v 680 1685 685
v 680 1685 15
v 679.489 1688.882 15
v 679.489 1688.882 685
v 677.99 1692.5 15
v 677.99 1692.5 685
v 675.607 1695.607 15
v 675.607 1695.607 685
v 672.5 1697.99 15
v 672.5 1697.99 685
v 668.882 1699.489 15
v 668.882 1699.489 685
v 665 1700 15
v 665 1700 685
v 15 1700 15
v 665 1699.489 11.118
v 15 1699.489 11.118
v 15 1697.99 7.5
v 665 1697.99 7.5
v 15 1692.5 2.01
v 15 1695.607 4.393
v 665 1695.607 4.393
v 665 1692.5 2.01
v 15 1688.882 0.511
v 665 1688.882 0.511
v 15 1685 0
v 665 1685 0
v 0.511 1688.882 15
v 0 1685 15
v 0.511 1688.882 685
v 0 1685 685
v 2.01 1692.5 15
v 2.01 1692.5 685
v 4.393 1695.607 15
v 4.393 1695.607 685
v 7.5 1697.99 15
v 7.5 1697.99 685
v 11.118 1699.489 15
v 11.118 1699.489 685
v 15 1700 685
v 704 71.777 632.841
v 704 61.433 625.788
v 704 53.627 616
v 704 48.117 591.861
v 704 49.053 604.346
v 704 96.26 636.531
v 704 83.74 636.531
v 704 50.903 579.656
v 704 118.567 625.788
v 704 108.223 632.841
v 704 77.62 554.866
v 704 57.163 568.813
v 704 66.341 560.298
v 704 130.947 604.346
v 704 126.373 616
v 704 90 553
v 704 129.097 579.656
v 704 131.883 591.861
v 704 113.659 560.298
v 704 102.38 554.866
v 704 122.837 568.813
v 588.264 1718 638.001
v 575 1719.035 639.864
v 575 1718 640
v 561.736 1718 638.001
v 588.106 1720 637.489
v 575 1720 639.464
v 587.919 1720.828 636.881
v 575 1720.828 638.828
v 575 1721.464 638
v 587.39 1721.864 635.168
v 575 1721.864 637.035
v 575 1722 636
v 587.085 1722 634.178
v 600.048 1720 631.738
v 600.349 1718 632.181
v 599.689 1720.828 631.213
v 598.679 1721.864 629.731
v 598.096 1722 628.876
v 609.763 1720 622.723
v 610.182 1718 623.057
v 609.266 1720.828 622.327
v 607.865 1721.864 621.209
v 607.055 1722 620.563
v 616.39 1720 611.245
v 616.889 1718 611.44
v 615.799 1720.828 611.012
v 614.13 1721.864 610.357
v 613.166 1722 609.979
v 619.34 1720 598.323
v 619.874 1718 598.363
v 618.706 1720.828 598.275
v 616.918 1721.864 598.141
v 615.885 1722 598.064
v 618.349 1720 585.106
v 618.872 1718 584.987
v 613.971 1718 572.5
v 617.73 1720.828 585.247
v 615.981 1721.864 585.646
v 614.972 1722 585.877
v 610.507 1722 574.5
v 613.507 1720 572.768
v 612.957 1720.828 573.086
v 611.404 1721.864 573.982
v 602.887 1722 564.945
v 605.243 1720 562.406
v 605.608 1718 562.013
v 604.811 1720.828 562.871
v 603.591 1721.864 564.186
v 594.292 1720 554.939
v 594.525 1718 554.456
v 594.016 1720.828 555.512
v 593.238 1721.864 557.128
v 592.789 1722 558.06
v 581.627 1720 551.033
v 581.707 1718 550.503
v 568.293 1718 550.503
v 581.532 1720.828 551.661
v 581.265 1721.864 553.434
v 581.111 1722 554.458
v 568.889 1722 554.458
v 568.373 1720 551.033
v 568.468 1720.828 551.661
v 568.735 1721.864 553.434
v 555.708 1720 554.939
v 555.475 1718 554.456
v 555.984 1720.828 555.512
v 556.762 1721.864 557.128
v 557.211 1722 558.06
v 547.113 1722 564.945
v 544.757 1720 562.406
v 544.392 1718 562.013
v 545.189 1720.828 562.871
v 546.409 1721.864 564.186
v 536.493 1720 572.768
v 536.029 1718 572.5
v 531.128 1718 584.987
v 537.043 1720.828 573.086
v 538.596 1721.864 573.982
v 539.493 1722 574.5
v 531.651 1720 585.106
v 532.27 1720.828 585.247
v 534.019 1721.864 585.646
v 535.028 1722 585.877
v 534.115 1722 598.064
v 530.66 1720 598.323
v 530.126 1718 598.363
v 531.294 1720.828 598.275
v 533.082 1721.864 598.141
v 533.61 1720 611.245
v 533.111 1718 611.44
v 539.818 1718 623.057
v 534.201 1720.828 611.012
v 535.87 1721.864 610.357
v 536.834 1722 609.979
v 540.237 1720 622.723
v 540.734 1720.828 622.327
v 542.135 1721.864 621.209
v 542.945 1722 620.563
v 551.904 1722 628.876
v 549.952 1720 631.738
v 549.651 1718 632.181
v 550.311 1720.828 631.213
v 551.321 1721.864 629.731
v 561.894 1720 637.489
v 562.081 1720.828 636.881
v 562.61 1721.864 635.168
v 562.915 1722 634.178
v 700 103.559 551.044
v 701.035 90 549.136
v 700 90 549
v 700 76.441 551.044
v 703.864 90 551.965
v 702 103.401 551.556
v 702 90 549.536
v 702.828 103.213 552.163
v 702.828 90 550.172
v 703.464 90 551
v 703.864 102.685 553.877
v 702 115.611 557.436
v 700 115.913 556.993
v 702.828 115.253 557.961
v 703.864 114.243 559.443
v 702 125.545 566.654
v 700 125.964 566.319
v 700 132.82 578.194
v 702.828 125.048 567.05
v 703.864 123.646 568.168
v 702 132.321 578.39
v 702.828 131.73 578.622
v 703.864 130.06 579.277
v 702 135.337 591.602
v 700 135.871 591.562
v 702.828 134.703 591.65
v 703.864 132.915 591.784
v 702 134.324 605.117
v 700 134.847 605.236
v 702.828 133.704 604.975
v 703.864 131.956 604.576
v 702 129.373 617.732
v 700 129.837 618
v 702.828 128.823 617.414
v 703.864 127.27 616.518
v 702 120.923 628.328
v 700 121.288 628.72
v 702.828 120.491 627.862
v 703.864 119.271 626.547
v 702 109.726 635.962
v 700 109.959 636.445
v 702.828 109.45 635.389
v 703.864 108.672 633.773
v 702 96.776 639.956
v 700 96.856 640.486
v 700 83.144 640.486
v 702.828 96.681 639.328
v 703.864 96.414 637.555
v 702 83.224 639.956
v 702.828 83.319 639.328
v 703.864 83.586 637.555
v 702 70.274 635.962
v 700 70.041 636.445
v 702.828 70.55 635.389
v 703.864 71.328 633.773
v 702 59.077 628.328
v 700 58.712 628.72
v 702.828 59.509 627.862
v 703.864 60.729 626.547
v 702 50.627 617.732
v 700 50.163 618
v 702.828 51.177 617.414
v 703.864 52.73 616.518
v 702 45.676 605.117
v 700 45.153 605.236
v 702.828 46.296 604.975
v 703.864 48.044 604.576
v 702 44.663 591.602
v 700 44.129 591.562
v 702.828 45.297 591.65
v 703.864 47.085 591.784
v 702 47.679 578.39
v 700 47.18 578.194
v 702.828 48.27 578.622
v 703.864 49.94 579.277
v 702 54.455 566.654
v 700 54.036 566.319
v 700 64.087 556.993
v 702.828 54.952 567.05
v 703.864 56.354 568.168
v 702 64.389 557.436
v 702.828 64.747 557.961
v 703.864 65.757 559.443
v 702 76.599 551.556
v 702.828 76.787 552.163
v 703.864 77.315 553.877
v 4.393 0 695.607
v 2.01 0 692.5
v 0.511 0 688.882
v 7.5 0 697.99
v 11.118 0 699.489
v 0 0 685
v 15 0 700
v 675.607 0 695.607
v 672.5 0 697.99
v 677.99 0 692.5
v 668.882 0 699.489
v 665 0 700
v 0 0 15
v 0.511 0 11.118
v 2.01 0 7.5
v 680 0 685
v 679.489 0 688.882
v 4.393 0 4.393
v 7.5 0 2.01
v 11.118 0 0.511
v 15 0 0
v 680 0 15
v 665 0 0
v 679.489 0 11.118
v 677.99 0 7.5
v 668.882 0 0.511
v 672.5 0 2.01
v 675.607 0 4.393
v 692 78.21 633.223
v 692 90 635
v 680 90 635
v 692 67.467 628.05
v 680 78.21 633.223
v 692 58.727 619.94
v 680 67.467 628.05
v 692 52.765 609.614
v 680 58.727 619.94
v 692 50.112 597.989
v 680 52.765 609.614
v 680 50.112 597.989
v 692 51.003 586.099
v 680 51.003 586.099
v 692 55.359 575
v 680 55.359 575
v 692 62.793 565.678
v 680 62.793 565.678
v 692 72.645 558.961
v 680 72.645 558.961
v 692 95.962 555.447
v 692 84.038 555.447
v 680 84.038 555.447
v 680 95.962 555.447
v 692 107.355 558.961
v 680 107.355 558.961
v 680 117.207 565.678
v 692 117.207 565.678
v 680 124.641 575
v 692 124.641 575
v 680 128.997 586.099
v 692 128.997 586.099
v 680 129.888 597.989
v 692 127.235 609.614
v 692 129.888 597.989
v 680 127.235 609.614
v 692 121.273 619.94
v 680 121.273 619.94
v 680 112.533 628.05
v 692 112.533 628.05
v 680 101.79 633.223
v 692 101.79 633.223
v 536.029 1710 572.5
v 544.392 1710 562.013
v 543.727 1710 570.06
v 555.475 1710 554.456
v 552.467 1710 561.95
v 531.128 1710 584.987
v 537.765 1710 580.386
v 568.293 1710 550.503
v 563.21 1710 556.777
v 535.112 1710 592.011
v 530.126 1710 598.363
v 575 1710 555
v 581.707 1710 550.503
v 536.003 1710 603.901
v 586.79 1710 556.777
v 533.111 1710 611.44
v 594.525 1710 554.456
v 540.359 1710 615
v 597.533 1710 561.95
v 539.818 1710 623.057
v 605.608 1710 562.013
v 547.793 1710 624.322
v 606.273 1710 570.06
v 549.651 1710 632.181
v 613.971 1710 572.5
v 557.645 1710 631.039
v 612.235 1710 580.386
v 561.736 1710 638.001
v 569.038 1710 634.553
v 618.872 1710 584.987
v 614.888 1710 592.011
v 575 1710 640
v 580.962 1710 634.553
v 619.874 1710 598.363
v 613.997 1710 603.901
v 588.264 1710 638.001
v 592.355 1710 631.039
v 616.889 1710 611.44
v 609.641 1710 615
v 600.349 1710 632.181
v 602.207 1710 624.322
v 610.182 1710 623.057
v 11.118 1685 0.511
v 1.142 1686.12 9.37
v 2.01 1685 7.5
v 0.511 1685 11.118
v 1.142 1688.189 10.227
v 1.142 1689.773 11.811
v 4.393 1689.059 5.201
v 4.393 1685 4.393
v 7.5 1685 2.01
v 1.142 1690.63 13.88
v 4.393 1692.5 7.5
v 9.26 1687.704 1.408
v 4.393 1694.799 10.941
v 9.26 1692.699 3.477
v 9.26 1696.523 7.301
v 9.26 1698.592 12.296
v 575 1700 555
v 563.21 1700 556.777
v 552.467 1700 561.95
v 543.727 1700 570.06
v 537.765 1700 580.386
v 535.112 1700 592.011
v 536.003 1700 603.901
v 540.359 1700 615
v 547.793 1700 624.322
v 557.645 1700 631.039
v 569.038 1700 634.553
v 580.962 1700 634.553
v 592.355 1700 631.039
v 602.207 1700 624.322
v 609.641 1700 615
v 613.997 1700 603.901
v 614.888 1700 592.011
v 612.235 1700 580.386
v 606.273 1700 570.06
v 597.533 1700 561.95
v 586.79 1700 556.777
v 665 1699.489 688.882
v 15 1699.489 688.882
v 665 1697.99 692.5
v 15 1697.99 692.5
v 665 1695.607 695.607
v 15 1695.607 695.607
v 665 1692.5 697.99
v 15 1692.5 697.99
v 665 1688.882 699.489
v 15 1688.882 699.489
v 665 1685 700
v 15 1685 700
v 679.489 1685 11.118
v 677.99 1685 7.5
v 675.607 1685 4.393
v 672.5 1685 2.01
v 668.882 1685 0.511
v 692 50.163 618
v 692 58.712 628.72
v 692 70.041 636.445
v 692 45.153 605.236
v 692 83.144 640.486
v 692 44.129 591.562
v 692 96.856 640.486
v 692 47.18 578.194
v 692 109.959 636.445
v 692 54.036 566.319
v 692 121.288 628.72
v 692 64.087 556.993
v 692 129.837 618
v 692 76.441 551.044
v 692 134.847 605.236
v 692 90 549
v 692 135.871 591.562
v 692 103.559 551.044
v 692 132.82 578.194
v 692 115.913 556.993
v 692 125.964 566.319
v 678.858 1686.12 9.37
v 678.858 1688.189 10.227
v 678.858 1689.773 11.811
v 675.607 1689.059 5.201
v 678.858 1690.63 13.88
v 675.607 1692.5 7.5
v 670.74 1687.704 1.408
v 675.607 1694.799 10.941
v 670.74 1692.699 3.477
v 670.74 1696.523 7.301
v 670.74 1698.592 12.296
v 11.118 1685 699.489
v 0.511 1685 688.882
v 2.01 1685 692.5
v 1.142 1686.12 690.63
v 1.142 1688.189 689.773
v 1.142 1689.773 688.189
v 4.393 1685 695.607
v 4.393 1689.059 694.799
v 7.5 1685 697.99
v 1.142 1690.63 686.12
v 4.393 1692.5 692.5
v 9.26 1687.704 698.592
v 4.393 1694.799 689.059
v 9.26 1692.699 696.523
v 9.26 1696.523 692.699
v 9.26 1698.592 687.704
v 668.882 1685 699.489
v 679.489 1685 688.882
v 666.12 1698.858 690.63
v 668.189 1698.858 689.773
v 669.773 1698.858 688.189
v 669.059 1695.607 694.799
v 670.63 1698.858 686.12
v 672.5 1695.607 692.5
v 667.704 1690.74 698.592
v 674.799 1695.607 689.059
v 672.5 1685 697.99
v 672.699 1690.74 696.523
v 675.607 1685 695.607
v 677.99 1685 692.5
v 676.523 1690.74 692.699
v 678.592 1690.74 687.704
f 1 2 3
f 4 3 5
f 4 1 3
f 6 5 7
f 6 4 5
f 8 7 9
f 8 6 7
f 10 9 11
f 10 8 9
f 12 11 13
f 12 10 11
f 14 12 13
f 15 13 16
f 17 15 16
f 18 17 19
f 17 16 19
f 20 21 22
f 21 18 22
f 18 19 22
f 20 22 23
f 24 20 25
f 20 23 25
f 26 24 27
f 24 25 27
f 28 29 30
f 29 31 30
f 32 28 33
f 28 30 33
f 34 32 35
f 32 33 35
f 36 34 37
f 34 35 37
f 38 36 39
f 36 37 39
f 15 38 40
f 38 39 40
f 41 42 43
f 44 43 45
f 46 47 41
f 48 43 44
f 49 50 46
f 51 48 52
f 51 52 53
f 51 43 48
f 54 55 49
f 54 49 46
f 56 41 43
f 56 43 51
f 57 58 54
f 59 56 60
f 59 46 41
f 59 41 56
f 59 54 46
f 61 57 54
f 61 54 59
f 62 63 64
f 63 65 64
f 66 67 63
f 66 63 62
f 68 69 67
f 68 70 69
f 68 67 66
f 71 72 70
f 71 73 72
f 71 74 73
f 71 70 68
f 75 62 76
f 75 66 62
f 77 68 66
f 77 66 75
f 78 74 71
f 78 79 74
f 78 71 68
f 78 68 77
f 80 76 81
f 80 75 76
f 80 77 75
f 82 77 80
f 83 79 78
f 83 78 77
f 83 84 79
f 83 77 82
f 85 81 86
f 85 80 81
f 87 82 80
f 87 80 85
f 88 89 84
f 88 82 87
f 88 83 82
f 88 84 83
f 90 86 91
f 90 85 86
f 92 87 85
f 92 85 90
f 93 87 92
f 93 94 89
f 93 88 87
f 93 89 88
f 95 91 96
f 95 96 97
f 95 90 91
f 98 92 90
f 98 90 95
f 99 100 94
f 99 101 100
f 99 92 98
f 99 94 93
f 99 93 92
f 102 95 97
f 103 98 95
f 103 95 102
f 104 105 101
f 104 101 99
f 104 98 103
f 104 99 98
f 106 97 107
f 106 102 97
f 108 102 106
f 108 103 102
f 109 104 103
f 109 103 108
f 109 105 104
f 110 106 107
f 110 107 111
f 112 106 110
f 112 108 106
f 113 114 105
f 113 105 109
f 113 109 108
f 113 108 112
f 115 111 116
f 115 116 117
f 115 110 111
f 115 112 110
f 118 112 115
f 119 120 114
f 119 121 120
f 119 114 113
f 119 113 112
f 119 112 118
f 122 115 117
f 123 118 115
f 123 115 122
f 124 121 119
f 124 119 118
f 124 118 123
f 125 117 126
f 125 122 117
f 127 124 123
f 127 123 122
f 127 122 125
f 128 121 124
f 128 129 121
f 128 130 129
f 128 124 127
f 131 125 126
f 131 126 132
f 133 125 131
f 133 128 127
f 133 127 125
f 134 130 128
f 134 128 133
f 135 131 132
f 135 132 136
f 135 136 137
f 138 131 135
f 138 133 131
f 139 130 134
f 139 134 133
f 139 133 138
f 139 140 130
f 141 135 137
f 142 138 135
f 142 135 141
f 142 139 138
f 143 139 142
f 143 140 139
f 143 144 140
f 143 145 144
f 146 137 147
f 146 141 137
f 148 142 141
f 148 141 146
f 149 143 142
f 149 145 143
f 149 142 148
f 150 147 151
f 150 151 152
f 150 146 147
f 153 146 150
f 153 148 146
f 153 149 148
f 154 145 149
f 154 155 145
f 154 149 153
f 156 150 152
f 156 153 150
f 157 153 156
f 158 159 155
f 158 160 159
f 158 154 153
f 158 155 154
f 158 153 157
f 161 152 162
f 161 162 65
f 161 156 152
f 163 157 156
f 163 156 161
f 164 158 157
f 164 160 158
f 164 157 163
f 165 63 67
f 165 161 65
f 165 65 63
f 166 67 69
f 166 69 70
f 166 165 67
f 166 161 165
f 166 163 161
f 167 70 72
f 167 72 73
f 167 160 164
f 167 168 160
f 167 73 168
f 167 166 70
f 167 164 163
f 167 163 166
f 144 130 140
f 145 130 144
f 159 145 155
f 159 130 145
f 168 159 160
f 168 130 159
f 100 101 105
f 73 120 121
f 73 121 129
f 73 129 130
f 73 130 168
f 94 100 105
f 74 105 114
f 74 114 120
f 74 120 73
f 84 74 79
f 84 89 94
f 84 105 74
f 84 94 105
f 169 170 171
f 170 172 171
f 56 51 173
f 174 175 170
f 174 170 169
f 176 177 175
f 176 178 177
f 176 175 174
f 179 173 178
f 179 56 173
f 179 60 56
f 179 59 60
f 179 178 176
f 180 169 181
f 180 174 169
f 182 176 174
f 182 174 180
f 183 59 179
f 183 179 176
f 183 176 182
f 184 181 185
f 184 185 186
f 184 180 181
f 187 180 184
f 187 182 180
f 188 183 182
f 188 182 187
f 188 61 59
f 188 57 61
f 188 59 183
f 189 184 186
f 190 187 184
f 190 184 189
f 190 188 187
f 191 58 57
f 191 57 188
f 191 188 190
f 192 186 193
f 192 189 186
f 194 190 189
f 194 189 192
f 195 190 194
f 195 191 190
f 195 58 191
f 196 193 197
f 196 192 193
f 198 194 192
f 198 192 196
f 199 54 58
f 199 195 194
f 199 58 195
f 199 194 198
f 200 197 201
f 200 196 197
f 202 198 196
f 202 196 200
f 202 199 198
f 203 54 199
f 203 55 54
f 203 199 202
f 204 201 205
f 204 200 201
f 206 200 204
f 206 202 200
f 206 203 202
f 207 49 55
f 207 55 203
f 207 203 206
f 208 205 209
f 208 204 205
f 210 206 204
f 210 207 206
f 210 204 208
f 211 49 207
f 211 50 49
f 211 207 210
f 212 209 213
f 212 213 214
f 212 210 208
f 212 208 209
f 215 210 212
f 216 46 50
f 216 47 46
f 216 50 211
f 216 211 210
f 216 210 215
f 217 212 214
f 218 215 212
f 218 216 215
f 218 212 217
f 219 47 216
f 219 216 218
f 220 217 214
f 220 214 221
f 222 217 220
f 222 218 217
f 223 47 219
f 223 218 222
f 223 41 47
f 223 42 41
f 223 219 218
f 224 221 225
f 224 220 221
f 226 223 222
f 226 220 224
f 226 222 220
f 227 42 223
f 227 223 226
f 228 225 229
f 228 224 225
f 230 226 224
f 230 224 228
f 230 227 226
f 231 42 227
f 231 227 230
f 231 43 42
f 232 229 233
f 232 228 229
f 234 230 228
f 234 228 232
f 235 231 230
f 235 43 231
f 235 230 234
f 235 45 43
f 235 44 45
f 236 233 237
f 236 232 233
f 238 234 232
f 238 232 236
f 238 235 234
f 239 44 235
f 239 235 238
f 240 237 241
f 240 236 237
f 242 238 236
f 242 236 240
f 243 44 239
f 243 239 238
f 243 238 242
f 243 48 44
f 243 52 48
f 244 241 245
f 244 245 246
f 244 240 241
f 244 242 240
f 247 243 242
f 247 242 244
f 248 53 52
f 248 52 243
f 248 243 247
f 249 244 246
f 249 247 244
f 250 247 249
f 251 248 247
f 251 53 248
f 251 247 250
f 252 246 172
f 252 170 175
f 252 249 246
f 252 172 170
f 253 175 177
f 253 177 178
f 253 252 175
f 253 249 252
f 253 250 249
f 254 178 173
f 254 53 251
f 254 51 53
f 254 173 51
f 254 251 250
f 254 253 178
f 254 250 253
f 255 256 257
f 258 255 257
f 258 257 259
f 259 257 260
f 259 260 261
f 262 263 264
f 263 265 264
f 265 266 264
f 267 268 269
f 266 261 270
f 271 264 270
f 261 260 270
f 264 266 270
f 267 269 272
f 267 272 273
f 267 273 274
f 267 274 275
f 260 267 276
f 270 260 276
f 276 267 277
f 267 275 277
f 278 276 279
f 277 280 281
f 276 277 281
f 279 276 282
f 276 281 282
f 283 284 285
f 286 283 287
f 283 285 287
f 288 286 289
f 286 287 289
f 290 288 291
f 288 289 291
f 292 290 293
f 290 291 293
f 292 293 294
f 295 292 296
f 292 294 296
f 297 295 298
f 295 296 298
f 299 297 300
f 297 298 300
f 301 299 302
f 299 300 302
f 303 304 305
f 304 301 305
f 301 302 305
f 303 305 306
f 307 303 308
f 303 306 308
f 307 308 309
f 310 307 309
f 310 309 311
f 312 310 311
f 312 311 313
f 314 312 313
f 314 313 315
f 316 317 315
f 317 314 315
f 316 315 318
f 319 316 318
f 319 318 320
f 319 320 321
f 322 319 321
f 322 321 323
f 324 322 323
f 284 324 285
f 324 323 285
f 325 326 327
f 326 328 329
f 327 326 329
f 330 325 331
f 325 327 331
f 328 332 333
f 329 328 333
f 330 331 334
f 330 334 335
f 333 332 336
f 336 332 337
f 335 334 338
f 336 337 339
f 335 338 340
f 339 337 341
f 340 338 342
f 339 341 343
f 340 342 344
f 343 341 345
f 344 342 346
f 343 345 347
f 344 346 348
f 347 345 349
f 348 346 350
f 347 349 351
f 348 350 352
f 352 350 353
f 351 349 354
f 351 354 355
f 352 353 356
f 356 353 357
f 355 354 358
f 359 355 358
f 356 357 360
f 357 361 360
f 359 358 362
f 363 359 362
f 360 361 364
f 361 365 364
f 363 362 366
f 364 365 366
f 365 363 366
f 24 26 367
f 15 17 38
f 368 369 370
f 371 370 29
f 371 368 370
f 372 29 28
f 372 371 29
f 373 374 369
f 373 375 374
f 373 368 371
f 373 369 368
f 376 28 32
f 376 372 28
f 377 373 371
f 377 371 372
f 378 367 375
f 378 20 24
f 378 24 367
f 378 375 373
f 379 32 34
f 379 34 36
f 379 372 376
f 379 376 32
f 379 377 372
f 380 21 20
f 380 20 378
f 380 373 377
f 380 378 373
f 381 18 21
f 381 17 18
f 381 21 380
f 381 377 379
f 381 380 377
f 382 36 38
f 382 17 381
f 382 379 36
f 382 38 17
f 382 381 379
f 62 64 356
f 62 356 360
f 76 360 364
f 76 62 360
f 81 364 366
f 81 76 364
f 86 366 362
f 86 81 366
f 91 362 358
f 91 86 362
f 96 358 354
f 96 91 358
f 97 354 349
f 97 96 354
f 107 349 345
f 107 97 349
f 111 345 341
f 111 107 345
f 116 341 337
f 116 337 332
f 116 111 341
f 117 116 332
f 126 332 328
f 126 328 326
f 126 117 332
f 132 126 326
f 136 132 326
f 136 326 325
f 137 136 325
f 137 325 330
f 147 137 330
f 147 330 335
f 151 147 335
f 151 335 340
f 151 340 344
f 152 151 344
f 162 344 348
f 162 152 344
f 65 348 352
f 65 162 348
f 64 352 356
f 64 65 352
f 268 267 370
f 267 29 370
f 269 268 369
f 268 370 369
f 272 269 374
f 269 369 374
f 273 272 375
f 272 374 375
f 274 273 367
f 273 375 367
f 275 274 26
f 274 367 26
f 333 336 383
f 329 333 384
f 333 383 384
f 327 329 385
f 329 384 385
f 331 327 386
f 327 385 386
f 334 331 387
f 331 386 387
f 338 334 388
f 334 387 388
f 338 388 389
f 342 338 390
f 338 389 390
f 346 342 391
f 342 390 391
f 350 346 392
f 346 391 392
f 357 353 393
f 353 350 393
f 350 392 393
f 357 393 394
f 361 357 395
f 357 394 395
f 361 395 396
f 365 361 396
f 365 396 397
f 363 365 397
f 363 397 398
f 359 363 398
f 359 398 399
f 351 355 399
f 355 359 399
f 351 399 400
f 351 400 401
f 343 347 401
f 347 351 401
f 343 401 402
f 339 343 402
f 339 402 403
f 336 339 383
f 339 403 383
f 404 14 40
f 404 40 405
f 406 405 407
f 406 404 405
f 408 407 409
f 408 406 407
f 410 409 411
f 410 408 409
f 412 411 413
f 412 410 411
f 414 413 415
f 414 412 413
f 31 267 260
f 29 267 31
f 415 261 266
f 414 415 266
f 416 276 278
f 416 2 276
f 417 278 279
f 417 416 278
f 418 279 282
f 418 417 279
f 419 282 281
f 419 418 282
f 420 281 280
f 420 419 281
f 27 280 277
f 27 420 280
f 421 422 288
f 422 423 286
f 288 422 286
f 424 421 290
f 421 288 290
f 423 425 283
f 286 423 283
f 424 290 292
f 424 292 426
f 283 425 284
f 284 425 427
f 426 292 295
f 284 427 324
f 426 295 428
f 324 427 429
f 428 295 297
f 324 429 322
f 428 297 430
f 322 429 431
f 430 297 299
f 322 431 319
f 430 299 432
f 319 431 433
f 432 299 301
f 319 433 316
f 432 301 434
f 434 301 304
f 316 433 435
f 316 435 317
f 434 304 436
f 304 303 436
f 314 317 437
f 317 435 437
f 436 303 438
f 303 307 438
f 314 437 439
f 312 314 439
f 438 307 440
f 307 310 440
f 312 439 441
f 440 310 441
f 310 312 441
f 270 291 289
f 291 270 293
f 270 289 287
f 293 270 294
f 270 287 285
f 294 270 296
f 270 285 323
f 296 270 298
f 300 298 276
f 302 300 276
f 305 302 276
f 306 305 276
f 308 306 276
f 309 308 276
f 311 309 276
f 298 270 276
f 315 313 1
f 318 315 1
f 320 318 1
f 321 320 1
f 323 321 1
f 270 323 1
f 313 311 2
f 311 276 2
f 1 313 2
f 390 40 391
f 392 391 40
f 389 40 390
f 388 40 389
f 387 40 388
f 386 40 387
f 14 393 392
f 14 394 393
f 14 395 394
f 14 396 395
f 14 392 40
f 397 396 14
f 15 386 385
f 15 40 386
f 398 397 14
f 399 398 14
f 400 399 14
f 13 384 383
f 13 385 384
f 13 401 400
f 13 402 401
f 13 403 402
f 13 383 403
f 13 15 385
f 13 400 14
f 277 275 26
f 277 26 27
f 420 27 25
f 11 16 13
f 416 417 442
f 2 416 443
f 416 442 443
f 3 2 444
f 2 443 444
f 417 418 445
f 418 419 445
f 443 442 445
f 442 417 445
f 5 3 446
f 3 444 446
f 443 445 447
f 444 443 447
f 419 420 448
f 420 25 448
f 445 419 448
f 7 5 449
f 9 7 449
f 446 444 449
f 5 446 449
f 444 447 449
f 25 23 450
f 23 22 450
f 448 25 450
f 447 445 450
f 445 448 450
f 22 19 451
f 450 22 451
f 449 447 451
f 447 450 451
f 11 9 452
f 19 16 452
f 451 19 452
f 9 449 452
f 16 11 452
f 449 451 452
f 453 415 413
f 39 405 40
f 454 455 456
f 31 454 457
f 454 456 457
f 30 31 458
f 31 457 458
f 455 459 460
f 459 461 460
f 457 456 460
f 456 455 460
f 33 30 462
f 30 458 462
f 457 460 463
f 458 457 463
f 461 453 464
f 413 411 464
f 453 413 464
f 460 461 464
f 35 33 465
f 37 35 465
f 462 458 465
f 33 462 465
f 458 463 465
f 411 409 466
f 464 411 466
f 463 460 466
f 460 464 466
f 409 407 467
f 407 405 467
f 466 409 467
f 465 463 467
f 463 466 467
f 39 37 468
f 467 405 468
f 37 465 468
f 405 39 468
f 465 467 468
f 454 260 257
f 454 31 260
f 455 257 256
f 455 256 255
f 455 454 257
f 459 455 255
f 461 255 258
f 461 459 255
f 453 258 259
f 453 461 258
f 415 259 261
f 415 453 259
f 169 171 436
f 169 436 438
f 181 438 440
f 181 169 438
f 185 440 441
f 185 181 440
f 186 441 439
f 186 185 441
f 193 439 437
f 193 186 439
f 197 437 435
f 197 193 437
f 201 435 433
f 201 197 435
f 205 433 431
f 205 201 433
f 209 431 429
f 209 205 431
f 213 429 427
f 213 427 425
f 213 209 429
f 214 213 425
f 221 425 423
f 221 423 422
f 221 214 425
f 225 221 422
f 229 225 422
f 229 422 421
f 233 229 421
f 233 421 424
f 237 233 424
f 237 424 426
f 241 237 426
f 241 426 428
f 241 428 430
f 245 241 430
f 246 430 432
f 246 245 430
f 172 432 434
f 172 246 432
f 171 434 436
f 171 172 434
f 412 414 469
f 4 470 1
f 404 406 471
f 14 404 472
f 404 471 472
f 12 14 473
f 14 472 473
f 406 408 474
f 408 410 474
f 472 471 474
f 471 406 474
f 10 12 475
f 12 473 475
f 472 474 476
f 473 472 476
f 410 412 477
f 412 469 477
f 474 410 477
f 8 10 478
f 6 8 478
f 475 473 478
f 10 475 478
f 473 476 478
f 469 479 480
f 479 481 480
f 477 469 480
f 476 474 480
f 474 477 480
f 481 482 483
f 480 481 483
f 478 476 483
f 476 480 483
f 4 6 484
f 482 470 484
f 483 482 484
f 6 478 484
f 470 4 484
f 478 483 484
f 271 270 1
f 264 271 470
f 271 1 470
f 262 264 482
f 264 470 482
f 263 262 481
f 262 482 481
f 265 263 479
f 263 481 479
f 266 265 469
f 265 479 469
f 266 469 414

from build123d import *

# Parameters (mm, degrees)
CROQUIS1_W              = 680
CROQUIS1_H              = 1700
SALIENTE_EXTRUIR1_DEPTH = 700
REDONDEO1_R             = 15
CROQUIS4_R              = 40
SALIENTE_EXTRUIR4_DEPTH = 22
CROQUIS5_R              = 45
SALIENTE_EXTRUIR5_DEPTH = 12
REDONDEO3_R             = 4
CROQUIS6_R              = 40
SALIENTE_EXTRUIR6_DEPTH = 24
CROQUIS7_R              = 46
SALIENTE_EXTRUIR7_DEPTH = 12
REDONDEO5_R             = 4


with BuildPart() as part:
    # Croquis1 → Saliente-Extruir1 (new body)
    with BuildSketch(Plane.XY):
        with Locations((340, 850)):
            Rectangle(CROQUIS1_W, CROQUIS1_H)
    extrude(amount=SALIENTE_EXTRUIR1_DEPTH)

    # Redondeo1
    redondeo1_edges = [part.edges().sort_by_distance(p)[0] for p in [
        (680, 850, 700),
        (340, 1700, 700),
        (0, 850, 700),
        (340, 1700, 0),
        (680, 850, 0),
        (0, 850, 0),
        (0, 1700, 350),
        (680, 1700, 350),
    ]]
    fillet(redondeo1_edges, radius=REDONDEO1_R)

    # Croquis4 → Saliente-Extruir4 (add)
    with BuildSketch(Plane(origin=(0, 1700, 0), x_dir=(1, 0, 0), z_dir=(0, 1, 0))):
        with Locations(Location((575, -595, 0), (0, 0, 90))):
            Circle(CROQUIS4_R)
    extrude(amount=SALIENTE_EXTRUIR4_DEPTH)

    # Croquis5 → Saliente-Extruir5 (add)
    with BuildSketch(Plane(origin=(0, 1722, 0), x_dir=(1, 0, 0), z_dir=(0, 1, 0))):
        with Locations(Location((575, -595, 0), (0, 0, 270))):
            Circle(CROQUIS5_R)
    extrude(amount=-SALIENTE_EXTRUIR5_DEPTH)

    # Redondeo3
    redondeo3_edges = [part.edges().sort_by_distance(p)[0] for p in [
        (575, 1722, 550),
    ]]
    fillet(redondeo3_edges, radius=REDONDEO3_R)

    # Croquis6 → Saliente-Extruir6 (add)
    with BuildSketch(Plane(origin=(680, 0, 0), x_dir=(0, 0, -1), z_dir=(1, 0, 0))):
        with Locations(Location((-595, 90, 0), (0, 0, 180))):
            Circle(CROQUIS6_R)
    extrude(amount=SALIENTE_EXTRUIR6_DEPTH)

    # Croquis7 → Saliente-Extruir7 (add)
    with BuildSketch(Plane(origin=(704, 0, 0), x_dir=(0, 0, -1), z_dir=(1, 0, 0))):
        with Locations((-595, 90)):
            Circle(CROQUIS7_R)
    extrude(amount=-SALIENTE_EXTRUIR7_DEPTH)

    # Redondeo5
    redondeo5_edges = [part.edges().sort_by_distance(p)[0] for p in [
        (704, 90, 641),
    ]]
    fillet(redondeo5_edges, radius=REDONDEO5_R)


solid = part.part
